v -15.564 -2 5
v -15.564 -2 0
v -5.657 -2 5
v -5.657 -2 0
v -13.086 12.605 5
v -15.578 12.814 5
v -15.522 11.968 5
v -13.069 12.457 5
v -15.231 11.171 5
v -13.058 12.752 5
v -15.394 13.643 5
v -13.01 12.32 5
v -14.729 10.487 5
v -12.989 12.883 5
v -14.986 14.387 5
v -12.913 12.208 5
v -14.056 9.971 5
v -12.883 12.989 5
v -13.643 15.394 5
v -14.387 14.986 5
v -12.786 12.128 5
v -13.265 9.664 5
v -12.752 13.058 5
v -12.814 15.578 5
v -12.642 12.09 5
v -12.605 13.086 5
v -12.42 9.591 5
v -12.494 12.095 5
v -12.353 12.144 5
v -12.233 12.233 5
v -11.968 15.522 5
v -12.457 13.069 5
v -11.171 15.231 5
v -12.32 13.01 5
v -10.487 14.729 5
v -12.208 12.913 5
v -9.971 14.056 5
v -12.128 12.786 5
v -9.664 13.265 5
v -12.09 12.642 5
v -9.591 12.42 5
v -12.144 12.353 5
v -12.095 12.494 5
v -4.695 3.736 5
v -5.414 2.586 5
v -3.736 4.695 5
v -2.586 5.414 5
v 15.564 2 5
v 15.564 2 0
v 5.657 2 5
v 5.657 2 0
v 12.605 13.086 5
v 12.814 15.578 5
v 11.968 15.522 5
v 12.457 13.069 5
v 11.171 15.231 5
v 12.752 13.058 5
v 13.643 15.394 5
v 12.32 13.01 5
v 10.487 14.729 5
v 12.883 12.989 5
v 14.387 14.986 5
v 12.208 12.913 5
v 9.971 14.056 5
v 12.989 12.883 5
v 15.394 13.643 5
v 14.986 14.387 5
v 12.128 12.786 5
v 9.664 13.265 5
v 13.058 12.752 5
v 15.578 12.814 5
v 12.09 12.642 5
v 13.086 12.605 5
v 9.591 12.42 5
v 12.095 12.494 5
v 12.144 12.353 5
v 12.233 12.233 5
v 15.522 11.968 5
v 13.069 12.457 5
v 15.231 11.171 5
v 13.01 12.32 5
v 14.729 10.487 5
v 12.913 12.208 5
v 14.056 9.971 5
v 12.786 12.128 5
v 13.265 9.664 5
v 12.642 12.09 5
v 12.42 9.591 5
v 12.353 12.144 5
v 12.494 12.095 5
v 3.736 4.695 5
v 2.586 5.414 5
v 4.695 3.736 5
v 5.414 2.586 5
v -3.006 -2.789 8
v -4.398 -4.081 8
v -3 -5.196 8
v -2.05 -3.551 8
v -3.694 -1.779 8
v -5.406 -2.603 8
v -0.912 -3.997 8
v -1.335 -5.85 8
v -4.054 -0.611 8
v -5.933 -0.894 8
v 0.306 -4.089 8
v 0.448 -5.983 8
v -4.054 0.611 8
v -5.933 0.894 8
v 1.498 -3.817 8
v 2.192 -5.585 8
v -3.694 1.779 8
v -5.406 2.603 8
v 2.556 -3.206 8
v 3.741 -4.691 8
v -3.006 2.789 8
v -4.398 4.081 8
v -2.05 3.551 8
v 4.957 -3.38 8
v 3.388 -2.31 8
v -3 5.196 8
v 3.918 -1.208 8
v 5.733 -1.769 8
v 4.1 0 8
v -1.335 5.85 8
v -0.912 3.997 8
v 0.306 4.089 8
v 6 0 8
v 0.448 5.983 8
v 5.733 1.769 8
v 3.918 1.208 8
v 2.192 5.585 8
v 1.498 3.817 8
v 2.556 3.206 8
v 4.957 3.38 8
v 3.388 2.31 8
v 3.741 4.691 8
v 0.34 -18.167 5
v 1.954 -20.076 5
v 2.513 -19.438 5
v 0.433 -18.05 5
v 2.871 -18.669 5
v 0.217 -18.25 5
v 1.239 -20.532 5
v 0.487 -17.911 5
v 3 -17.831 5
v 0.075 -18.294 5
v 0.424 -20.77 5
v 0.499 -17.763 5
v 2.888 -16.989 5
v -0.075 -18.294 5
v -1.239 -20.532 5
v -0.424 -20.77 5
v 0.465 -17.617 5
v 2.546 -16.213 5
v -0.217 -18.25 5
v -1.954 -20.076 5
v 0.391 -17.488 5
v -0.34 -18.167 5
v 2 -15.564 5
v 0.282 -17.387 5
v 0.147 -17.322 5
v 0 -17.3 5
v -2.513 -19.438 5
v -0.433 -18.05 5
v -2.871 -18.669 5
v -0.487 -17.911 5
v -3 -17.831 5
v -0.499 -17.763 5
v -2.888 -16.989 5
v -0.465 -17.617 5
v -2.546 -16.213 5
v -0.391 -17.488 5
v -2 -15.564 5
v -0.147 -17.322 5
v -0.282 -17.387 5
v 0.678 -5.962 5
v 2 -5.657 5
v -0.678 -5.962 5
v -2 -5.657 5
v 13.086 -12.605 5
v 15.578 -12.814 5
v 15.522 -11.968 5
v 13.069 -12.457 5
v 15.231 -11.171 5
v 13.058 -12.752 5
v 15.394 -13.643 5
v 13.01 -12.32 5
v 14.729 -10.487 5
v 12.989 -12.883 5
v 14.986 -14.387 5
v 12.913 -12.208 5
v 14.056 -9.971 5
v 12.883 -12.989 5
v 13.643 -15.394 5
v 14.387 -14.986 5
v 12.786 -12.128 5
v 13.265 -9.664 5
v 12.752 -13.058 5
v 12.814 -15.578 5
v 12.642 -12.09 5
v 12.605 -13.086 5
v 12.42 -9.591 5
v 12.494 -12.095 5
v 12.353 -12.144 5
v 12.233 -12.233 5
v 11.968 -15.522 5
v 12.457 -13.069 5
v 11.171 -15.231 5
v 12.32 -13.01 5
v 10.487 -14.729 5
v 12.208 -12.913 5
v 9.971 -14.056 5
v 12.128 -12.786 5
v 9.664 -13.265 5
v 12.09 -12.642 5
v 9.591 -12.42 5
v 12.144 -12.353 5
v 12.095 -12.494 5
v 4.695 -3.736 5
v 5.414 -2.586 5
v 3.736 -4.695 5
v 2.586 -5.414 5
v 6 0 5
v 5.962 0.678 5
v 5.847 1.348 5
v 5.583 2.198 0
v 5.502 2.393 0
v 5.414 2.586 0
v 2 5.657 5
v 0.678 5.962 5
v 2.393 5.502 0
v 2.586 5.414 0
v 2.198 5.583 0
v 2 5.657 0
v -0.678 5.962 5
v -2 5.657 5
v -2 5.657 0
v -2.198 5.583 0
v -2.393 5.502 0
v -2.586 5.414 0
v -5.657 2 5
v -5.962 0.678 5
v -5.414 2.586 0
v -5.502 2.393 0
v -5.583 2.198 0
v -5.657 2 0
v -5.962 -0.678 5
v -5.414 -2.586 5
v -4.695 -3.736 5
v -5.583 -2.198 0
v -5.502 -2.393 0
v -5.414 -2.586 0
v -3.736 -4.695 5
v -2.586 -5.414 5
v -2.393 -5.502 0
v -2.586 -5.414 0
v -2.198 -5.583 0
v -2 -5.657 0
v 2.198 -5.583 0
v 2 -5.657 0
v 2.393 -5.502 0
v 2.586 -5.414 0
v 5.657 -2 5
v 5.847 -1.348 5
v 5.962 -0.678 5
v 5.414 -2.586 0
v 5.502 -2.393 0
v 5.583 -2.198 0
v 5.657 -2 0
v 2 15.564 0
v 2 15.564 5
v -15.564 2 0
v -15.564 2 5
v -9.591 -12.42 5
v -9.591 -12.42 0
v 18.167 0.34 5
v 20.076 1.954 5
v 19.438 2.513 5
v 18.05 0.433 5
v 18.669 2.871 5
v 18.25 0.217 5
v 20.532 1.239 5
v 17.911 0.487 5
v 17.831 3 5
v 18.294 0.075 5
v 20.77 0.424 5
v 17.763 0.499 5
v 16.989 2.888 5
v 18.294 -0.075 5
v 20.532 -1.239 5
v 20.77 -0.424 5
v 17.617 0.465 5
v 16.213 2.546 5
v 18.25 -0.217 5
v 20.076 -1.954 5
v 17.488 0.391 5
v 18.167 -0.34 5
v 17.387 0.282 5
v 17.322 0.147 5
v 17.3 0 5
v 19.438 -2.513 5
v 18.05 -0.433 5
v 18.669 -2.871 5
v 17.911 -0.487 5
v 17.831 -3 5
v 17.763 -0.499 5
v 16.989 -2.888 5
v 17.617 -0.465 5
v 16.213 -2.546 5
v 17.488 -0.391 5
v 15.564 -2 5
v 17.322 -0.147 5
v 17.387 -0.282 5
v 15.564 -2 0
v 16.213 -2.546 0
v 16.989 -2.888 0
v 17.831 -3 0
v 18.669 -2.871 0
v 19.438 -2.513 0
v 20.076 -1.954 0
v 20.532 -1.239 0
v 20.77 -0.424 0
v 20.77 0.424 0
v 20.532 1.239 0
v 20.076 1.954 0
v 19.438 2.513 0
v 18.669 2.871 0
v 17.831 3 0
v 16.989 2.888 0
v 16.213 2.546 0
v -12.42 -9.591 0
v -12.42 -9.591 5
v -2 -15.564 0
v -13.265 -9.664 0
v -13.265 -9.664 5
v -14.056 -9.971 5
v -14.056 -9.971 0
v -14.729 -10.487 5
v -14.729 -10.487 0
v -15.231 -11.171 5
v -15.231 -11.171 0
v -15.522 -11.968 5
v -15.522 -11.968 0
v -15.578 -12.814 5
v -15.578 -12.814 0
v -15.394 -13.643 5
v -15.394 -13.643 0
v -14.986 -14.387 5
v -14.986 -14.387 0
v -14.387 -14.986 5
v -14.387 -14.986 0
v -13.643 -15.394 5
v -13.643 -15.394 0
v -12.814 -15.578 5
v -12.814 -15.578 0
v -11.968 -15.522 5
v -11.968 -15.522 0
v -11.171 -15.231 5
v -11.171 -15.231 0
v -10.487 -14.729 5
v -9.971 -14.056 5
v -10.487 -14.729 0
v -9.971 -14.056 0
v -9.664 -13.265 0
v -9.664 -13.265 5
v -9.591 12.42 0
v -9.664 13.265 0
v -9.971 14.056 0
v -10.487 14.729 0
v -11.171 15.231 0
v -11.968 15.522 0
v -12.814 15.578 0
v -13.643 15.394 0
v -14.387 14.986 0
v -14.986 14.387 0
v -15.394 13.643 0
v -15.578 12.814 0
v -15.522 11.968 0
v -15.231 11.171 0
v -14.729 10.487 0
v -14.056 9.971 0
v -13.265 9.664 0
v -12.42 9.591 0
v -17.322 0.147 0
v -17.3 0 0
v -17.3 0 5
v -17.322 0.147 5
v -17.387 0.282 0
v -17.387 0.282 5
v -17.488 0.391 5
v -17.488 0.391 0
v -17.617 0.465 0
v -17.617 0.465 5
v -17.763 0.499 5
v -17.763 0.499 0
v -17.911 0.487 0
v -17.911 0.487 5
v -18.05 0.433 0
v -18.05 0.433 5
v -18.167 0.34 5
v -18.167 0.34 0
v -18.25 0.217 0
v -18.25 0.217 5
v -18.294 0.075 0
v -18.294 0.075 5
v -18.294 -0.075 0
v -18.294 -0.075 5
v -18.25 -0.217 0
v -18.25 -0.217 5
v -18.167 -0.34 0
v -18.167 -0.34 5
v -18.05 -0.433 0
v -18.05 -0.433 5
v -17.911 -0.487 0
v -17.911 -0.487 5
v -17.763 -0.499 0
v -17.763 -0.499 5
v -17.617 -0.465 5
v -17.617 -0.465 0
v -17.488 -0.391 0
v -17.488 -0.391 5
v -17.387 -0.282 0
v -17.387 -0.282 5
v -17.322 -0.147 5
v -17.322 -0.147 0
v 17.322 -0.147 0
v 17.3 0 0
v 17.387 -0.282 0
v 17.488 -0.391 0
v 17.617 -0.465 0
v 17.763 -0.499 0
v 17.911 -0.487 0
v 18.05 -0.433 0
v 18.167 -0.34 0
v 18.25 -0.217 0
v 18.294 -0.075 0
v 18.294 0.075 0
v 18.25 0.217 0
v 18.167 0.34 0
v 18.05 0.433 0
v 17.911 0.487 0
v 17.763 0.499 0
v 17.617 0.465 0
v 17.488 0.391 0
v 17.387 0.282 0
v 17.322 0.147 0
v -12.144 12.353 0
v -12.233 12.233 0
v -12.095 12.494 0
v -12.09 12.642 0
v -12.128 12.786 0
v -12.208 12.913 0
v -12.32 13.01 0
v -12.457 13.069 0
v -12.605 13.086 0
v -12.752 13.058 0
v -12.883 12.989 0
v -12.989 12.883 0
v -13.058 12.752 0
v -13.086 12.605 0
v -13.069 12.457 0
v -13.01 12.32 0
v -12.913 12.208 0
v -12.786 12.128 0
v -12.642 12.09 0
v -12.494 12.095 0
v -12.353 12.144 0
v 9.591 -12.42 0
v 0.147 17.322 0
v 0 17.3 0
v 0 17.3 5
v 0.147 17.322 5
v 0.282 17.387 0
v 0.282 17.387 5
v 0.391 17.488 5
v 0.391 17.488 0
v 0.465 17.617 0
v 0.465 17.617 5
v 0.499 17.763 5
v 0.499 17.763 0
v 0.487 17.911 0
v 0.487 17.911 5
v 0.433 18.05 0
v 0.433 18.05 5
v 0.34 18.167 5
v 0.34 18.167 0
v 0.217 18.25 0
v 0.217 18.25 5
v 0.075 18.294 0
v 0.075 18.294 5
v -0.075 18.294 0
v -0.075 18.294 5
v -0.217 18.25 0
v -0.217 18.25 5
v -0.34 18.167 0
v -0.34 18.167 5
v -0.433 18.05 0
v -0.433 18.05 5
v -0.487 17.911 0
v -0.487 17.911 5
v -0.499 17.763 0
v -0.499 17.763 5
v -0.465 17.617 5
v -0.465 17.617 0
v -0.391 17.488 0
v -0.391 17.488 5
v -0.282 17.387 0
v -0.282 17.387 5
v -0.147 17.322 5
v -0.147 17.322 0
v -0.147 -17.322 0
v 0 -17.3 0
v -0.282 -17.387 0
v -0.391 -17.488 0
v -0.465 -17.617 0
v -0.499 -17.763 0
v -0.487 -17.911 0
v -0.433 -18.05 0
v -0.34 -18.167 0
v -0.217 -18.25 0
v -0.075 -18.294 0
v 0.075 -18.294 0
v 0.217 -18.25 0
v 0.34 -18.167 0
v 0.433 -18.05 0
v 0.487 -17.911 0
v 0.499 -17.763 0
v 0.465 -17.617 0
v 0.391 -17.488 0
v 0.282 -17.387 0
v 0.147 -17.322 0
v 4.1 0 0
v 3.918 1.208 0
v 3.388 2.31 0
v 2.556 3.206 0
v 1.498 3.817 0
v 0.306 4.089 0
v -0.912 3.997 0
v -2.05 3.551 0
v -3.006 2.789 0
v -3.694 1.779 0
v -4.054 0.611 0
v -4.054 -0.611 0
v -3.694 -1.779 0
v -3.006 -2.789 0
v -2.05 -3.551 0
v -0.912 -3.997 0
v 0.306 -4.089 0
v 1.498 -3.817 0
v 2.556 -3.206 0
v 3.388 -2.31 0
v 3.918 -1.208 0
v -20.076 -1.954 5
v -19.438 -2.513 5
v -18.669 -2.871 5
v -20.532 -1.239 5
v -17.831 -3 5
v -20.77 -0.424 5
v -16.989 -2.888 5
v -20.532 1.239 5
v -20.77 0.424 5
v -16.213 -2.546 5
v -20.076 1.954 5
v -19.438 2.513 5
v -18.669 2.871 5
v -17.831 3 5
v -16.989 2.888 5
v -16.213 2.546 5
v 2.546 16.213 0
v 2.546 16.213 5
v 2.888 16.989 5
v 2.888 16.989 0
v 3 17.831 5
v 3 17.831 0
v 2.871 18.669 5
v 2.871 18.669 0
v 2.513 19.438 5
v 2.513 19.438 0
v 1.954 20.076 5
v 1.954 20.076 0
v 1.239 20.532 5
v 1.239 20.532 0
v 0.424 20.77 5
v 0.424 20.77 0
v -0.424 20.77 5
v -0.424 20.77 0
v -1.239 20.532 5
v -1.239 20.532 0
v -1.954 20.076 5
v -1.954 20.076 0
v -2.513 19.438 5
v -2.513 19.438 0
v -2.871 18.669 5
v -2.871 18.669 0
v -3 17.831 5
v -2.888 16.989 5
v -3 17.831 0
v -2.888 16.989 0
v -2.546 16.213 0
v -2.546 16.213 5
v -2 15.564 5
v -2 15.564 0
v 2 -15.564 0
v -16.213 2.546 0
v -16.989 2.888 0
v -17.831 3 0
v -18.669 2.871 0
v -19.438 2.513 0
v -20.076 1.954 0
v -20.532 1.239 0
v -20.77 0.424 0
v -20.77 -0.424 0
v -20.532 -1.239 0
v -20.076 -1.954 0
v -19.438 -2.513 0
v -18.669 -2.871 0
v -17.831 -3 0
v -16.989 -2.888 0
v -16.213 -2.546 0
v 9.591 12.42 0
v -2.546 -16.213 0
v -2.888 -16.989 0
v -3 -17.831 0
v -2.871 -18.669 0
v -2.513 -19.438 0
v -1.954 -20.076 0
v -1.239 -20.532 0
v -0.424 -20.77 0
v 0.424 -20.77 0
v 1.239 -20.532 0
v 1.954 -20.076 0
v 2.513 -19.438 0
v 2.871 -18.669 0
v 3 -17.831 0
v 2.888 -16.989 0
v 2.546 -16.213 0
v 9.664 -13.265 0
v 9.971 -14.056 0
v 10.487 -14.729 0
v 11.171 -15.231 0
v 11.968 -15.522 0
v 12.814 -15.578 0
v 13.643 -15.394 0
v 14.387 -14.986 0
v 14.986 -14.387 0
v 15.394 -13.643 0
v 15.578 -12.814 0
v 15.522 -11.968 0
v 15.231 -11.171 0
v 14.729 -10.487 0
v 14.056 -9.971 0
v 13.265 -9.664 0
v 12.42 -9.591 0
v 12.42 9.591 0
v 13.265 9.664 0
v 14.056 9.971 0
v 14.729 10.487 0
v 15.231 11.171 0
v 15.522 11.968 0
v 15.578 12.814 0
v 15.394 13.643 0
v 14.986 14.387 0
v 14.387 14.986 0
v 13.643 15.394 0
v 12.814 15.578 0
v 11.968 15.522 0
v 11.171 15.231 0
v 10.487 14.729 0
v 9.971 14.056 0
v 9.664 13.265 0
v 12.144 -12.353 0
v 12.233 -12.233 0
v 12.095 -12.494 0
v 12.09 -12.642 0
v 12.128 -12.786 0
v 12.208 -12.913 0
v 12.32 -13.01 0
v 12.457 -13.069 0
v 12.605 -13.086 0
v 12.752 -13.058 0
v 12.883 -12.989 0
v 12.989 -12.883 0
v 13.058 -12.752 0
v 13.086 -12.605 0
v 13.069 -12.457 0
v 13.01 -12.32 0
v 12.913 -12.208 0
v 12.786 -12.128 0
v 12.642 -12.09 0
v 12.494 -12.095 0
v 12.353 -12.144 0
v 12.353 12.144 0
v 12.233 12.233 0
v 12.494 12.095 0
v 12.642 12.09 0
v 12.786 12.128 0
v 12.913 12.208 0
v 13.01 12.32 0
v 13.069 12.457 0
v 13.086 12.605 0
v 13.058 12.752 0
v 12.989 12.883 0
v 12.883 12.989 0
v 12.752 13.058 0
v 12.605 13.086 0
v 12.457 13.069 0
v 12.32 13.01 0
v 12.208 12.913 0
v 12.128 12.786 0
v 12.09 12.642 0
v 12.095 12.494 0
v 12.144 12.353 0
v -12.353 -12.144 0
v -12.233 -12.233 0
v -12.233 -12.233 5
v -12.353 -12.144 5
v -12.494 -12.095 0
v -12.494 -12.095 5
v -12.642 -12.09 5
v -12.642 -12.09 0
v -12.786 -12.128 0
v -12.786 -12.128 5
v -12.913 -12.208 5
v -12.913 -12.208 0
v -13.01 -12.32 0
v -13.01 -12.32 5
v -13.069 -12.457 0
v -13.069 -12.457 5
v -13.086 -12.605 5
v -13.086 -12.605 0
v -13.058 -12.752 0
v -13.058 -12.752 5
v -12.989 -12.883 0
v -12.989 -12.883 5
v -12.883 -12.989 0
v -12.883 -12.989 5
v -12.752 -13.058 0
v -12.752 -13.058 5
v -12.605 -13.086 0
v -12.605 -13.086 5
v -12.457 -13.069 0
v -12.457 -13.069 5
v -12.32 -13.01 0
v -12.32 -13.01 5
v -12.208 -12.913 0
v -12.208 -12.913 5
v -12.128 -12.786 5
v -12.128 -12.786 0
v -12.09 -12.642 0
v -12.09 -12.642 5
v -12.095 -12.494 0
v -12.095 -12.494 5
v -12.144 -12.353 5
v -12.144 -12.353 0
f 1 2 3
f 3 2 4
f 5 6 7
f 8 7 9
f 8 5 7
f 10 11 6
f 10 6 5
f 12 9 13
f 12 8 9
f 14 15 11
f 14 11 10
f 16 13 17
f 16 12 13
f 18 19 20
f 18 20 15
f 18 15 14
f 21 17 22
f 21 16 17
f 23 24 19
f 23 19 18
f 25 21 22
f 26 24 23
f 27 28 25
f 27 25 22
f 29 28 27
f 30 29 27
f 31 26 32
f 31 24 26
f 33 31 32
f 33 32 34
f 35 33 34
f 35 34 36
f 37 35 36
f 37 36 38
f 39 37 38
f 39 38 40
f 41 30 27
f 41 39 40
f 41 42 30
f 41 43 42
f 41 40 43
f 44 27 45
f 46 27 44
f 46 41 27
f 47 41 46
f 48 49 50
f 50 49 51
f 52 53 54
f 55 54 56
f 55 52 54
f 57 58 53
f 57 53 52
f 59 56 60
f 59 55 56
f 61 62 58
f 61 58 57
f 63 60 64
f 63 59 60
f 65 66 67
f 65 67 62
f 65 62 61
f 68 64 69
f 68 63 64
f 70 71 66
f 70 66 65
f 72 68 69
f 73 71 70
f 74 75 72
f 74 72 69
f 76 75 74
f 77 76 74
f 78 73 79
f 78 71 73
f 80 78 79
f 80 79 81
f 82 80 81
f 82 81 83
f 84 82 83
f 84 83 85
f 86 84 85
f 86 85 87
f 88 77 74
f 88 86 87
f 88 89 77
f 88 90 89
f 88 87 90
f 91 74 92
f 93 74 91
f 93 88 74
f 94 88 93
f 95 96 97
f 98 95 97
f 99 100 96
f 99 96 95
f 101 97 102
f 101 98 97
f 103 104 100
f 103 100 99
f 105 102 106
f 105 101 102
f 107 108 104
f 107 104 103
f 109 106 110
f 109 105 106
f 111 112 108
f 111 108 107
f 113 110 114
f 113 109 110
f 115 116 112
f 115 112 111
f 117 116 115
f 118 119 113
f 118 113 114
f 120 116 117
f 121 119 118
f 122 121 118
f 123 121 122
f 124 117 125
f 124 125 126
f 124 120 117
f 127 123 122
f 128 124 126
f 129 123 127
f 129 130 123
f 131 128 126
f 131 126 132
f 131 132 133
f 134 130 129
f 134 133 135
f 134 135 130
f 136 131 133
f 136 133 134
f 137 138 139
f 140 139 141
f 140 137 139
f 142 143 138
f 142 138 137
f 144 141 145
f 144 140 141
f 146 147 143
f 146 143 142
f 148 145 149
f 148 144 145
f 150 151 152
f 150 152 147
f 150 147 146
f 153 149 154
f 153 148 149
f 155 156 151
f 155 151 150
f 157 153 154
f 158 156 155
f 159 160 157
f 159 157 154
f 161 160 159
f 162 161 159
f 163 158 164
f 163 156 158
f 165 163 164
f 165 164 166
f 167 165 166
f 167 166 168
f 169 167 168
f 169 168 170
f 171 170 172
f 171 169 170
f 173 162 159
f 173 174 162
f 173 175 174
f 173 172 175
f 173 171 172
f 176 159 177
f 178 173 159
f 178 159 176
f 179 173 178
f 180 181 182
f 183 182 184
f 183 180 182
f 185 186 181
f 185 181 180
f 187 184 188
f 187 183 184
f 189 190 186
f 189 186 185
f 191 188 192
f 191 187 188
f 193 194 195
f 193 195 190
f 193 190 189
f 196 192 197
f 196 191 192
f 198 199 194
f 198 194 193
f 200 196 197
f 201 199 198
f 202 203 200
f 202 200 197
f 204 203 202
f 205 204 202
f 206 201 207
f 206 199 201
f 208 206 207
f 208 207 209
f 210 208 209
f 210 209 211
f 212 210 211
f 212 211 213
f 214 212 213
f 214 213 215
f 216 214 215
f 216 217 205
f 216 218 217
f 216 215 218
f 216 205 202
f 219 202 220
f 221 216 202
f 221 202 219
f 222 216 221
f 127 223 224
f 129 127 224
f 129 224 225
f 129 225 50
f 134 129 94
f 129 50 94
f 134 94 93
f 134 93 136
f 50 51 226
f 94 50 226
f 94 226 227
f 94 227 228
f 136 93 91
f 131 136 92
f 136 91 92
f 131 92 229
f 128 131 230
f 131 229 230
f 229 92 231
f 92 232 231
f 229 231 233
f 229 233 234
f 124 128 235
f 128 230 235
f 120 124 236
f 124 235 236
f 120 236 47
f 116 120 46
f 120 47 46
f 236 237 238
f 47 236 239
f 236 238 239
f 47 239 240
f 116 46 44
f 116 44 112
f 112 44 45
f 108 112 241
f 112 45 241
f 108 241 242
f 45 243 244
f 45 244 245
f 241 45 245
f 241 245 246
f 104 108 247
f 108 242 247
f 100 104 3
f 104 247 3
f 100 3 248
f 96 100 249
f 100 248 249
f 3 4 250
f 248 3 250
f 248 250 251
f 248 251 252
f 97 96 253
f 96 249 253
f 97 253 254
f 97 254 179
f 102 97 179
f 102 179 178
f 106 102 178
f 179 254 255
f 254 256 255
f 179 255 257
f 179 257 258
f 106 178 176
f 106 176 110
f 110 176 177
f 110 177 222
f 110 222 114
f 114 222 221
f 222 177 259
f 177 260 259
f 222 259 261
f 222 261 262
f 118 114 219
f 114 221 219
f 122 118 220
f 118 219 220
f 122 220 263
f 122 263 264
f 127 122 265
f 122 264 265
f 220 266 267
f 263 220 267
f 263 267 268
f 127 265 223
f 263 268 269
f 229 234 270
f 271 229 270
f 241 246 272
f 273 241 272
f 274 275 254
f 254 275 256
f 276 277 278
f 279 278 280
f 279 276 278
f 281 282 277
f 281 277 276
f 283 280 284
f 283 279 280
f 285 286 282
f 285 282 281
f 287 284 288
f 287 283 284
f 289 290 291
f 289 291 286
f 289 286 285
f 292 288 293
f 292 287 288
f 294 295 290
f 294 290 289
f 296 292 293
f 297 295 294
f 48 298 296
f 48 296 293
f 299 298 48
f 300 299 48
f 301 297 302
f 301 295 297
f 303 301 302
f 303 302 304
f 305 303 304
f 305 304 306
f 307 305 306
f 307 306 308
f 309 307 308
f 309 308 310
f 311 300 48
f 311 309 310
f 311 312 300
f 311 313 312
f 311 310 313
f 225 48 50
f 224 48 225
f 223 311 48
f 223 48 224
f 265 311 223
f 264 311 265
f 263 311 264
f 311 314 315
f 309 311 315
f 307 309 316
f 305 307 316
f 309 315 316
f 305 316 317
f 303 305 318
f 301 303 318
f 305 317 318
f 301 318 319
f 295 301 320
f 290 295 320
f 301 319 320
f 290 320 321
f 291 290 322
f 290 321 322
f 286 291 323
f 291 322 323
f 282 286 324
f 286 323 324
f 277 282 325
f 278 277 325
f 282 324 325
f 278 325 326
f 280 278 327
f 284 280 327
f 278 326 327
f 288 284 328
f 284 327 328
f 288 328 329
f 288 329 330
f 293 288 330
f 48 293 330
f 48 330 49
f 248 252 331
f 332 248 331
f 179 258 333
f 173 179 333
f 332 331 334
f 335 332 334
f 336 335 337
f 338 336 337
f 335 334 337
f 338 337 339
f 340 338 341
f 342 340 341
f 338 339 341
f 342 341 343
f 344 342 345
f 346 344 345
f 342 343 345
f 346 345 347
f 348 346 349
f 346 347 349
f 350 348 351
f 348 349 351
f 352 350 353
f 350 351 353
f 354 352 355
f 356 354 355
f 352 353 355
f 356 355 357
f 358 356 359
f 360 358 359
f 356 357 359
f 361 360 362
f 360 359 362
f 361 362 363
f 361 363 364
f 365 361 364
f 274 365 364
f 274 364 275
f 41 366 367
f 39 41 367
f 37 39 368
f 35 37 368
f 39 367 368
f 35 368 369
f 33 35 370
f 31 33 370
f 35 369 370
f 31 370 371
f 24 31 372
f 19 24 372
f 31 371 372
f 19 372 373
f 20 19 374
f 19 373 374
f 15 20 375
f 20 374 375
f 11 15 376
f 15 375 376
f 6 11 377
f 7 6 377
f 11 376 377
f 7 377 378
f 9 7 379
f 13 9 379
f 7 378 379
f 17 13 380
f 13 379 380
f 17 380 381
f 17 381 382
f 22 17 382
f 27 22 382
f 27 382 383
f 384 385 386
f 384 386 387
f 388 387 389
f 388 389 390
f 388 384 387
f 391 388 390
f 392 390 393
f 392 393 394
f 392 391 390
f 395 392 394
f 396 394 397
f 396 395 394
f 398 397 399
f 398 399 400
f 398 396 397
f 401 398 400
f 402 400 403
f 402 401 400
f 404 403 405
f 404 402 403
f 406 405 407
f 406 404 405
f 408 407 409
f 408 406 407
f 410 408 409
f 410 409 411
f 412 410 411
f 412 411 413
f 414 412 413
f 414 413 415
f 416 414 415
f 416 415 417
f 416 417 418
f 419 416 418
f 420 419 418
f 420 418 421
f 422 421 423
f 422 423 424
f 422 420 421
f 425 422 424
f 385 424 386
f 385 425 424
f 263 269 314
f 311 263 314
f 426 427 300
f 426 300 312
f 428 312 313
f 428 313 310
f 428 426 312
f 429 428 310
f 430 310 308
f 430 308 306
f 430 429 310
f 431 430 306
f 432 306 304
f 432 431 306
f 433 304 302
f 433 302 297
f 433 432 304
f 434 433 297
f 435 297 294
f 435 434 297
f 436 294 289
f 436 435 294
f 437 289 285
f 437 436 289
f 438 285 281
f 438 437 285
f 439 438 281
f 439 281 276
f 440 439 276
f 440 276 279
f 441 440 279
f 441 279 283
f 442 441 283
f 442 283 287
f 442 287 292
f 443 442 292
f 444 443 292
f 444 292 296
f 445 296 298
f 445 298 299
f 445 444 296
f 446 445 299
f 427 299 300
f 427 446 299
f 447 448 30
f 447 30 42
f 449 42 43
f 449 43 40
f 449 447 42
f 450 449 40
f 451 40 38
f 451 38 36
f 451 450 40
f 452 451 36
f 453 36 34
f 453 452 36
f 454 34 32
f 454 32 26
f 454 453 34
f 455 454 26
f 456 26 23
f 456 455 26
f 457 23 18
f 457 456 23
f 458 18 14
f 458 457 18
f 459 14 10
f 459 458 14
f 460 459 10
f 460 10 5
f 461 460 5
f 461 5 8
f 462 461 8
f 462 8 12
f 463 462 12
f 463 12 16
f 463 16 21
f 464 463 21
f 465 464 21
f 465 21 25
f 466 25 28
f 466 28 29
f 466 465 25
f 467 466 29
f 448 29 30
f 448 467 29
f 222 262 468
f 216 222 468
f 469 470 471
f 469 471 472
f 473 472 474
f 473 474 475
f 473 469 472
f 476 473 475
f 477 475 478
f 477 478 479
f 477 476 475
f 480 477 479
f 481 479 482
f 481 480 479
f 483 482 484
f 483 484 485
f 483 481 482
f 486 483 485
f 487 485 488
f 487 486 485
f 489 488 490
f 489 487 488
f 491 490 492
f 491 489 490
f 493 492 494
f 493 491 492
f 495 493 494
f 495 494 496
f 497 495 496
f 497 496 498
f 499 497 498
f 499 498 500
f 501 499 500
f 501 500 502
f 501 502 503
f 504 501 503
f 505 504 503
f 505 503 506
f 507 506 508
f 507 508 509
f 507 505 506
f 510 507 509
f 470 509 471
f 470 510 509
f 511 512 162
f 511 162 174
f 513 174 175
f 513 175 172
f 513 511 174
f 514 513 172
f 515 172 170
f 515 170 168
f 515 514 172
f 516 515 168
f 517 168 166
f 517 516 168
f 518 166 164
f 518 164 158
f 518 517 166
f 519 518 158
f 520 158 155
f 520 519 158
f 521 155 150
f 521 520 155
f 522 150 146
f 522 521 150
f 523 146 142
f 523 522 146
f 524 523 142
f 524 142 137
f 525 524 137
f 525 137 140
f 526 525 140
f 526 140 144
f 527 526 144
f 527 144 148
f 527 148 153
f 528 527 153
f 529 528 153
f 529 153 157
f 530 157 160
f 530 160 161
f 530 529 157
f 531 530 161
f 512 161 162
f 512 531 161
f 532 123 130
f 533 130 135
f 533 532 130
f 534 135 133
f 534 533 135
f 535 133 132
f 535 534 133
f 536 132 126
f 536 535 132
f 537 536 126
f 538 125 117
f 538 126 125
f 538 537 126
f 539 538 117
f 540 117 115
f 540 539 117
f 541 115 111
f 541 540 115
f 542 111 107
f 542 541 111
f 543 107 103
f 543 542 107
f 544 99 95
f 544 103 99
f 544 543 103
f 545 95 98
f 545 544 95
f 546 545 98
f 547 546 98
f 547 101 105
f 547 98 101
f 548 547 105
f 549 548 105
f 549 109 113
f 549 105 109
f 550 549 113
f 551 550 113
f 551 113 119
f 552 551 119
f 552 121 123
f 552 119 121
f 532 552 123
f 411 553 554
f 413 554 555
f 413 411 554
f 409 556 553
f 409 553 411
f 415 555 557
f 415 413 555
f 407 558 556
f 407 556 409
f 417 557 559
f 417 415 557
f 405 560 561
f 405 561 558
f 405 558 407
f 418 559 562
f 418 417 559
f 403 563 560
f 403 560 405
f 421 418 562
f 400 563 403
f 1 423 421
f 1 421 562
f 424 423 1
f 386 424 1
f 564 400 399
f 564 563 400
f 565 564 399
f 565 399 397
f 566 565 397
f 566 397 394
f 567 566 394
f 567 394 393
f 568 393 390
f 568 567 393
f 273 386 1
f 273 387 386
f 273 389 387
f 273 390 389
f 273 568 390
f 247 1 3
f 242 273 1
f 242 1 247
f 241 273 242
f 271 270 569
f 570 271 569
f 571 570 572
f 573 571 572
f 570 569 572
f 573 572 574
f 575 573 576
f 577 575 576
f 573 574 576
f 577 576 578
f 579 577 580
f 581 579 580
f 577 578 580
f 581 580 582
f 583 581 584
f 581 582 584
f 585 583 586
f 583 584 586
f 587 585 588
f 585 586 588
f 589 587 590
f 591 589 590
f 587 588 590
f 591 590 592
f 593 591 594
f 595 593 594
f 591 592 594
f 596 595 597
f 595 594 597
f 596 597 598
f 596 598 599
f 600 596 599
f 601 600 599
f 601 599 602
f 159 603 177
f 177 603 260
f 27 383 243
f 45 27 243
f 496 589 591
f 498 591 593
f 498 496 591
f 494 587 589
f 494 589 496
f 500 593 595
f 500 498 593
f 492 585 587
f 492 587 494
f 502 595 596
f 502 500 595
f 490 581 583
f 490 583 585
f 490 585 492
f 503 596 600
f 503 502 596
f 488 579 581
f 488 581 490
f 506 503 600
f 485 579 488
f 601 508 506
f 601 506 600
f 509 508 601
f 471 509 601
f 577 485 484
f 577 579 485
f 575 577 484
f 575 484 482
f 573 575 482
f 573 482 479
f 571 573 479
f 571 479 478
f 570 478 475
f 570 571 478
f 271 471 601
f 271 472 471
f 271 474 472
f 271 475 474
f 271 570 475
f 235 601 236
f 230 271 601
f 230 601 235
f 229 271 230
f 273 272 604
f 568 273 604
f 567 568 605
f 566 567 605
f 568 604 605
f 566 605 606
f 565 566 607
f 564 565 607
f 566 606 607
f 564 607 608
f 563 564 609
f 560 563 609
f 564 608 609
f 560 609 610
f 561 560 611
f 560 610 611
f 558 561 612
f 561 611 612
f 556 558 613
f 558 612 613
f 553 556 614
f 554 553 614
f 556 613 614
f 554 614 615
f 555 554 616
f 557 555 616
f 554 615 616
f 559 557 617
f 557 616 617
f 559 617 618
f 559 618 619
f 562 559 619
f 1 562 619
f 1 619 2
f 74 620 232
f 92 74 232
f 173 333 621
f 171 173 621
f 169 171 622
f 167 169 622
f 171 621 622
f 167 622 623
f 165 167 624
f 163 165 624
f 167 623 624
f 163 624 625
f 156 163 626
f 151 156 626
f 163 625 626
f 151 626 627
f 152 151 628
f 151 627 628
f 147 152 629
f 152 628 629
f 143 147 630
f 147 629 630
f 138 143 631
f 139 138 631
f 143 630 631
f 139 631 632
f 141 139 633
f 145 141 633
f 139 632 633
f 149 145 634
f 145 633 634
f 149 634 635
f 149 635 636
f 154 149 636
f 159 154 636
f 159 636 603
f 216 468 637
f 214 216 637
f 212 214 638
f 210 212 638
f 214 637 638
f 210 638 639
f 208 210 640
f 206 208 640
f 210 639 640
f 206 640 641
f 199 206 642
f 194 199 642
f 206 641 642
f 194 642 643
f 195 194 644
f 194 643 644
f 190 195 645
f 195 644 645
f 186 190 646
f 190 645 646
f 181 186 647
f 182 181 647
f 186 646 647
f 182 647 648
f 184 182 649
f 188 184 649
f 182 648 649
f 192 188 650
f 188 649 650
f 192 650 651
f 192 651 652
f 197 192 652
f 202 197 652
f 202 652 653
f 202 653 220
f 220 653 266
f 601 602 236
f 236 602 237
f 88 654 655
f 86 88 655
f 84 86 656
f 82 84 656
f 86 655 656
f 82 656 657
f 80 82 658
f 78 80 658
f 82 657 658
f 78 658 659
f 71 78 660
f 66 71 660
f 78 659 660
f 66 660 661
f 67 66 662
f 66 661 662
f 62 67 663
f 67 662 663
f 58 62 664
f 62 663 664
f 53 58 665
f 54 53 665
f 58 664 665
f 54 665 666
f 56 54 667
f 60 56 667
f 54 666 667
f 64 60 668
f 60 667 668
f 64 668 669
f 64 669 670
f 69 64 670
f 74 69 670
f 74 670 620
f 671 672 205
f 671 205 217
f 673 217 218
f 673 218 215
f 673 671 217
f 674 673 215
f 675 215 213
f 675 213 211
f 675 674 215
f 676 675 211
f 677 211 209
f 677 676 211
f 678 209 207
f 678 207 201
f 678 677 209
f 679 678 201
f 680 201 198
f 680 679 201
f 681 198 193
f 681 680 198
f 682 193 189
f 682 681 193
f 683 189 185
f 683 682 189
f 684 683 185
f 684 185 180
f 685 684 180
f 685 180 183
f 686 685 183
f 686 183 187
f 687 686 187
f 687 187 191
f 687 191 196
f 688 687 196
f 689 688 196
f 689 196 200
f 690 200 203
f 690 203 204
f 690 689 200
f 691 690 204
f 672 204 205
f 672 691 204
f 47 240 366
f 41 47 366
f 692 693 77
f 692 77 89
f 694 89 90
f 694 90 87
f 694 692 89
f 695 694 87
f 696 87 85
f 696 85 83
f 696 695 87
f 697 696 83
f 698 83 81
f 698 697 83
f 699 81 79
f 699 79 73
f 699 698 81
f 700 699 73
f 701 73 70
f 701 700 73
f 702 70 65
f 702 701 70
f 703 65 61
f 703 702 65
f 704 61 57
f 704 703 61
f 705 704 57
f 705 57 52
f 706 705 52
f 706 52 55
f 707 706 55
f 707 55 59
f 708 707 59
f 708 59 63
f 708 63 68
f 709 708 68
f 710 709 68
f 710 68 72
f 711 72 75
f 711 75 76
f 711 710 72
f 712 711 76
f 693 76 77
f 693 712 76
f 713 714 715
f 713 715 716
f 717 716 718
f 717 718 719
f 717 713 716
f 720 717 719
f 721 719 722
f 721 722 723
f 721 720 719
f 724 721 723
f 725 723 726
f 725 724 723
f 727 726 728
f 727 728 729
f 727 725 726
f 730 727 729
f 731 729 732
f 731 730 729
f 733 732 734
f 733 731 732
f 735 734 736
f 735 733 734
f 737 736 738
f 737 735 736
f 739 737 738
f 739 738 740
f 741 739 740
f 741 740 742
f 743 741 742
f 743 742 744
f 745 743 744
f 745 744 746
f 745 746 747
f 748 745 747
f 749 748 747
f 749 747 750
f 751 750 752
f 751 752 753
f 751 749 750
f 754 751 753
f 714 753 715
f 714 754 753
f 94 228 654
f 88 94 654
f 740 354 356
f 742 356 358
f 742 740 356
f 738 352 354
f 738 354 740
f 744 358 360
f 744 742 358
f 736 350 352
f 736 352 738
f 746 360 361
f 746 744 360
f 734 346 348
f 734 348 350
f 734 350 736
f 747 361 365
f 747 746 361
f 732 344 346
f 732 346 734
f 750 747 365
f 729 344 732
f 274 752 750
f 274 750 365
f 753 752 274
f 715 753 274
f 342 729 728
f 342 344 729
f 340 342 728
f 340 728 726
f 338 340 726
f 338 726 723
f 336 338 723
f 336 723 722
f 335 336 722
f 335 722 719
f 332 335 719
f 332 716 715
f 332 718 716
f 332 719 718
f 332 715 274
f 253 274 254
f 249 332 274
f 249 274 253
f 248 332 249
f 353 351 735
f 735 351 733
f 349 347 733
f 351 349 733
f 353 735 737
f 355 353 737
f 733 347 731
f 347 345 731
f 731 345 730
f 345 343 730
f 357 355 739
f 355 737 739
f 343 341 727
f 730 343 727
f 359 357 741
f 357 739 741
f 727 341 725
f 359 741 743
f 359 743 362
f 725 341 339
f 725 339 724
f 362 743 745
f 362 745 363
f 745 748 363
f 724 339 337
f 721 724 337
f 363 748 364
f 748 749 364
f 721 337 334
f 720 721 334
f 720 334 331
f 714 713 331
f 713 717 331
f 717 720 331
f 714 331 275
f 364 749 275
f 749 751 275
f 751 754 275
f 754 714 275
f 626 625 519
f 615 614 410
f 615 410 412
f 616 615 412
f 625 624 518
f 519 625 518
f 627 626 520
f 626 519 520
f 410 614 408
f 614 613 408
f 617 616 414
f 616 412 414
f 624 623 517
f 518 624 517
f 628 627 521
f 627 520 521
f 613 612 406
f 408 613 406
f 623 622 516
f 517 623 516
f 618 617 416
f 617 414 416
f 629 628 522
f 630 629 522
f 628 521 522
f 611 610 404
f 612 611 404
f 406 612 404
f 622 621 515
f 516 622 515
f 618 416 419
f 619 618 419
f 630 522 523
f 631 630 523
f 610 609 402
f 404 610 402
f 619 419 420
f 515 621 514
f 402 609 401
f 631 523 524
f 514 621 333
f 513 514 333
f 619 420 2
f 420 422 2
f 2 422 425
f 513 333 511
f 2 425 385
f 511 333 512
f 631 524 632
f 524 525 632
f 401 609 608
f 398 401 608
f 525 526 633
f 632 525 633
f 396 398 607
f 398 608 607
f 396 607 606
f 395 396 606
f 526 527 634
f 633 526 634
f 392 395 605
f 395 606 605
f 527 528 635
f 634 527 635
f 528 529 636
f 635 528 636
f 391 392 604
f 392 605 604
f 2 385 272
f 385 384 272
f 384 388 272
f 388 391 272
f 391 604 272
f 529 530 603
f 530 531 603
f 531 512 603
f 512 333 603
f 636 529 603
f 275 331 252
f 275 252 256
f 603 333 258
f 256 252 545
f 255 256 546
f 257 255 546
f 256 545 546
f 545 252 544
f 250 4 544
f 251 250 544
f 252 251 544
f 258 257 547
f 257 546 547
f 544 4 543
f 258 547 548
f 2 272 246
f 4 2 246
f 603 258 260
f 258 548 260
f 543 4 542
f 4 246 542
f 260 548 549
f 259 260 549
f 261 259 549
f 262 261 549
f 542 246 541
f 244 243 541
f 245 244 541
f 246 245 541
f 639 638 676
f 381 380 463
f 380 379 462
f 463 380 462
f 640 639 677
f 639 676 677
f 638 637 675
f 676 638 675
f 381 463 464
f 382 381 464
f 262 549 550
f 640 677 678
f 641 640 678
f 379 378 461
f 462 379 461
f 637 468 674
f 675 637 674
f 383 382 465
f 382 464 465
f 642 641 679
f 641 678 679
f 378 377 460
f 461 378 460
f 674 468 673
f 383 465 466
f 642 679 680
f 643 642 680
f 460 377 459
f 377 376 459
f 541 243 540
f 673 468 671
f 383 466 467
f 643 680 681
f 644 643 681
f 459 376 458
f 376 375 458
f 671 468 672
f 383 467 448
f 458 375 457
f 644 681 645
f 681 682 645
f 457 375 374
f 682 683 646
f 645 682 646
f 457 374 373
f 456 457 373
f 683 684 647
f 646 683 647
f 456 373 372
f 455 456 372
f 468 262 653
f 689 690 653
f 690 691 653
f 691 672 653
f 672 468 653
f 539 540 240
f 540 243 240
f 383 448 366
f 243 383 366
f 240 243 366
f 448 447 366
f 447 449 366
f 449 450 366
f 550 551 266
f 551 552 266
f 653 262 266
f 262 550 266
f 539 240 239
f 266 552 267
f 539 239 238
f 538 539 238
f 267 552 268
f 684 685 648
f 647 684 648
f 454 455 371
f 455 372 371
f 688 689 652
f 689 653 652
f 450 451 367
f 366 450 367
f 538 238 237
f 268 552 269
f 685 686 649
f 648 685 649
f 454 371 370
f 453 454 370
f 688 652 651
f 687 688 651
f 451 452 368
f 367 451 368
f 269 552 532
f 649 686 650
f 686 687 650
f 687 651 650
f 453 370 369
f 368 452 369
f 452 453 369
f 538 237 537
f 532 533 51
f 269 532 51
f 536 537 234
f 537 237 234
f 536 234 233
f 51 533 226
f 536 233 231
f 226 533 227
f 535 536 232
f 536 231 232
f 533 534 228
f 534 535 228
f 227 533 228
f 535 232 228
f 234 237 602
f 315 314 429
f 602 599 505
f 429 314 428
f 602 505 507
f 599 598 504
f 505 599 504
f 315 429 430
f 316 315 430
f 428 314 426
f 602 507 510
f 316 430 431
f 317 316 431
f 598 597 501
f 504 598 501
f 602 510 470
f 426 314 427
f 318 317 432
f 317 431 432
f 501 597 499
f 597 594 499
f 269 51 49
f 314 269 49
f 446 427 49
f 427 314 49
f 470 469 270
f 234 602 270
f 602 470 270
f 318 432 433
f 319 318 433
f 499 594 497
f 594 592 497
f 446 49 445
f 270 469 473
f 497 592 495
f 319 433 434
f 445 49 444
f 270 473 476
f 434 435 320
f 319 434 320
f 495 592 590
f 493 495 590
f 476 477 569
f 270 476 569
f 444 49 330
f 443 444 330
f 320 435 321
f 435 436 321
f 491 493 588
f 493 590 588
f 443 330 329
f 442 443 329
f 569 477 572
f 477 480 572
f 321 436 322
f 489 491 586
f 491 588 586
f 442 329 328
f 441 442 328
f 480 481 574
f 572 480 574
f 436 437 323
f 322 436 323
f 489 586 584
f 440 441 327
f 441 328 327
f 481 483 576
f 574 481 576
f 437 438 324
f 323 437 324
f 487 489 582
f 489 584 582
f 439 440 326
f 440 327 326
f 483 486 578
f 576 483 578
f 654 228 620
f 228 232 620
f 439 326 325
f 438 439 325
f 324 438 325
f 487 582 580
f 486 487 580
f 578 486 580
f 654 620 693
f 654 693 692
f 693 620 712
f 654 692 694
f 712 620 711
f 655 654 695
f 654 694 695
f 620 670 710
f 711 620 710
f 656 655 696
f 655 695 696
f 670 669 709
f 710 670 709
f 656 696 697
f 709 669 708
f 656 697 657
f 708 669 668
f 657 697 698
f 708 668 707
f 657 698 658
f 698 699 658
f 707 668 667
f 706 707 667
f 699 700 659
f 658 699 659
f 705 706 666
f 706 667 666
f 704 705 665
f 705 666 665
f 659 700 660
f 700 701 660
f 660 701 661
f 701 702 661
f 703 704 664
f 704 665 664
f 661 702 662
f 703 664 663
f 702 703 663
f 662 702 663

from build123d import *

# Parameters (mm, degrees)
F1_R            = 6
F2_DEPTH        = 8
F0_R            = 0.5
F3_DEPTH        = 5
F3_COPIES_COUNT = 8
F4_R            = 4.1
F5_DEPTH        = 8.001


# Not quite as in the source:
# - a pattern or mirror of a feature is missing from the dataset's text; its kind, count and spacing are read off the source's solid


with BuildPart() as f2:
    # F1 (on Top) → F2 (new body)
    with BuildSketch(Plane.XY):
        Circle(F1_R)
    extrude(amount=F2_DEPTH)

    # F0 (on Top) → F3 (join)
    with BuildSketch(Plane.XY):
        with BuildLine():
            Line((0, 2), (-15.5639320225, 2))
            ThreePointArc((-15.5639320225, 2), (-20.8, 0), (-15.5639320225, -2))
            Line((-15.5639320225, -2), (0, -2))
            Line((0, -2), (0, 2))
        make_face()
        with Locations((-17.8, 0)):
            Circle(F0_R, mode=Mode.SUBTRACT)
    f3 = extrude(amount=F3_DEPTH)

    # F3_copies: F3 ×8 about axis
    f3_copies_axis = Axis((0, 0, 0), (0, 0, 1))
    for i in range(1, F3_COPIES_COUNT):
        add(f3.rotate(f3_copies_axis, i * 360 / F3_COPIES_COUNT))

    # F4 (on Top) → F5 (cut, through all)
    with BuildSketch(Plane.XY):
        Circle(F4_R)
    extrude(amount=F5_DEPTH, mode=Mode.SUBTRACT)


solid = f2.part
